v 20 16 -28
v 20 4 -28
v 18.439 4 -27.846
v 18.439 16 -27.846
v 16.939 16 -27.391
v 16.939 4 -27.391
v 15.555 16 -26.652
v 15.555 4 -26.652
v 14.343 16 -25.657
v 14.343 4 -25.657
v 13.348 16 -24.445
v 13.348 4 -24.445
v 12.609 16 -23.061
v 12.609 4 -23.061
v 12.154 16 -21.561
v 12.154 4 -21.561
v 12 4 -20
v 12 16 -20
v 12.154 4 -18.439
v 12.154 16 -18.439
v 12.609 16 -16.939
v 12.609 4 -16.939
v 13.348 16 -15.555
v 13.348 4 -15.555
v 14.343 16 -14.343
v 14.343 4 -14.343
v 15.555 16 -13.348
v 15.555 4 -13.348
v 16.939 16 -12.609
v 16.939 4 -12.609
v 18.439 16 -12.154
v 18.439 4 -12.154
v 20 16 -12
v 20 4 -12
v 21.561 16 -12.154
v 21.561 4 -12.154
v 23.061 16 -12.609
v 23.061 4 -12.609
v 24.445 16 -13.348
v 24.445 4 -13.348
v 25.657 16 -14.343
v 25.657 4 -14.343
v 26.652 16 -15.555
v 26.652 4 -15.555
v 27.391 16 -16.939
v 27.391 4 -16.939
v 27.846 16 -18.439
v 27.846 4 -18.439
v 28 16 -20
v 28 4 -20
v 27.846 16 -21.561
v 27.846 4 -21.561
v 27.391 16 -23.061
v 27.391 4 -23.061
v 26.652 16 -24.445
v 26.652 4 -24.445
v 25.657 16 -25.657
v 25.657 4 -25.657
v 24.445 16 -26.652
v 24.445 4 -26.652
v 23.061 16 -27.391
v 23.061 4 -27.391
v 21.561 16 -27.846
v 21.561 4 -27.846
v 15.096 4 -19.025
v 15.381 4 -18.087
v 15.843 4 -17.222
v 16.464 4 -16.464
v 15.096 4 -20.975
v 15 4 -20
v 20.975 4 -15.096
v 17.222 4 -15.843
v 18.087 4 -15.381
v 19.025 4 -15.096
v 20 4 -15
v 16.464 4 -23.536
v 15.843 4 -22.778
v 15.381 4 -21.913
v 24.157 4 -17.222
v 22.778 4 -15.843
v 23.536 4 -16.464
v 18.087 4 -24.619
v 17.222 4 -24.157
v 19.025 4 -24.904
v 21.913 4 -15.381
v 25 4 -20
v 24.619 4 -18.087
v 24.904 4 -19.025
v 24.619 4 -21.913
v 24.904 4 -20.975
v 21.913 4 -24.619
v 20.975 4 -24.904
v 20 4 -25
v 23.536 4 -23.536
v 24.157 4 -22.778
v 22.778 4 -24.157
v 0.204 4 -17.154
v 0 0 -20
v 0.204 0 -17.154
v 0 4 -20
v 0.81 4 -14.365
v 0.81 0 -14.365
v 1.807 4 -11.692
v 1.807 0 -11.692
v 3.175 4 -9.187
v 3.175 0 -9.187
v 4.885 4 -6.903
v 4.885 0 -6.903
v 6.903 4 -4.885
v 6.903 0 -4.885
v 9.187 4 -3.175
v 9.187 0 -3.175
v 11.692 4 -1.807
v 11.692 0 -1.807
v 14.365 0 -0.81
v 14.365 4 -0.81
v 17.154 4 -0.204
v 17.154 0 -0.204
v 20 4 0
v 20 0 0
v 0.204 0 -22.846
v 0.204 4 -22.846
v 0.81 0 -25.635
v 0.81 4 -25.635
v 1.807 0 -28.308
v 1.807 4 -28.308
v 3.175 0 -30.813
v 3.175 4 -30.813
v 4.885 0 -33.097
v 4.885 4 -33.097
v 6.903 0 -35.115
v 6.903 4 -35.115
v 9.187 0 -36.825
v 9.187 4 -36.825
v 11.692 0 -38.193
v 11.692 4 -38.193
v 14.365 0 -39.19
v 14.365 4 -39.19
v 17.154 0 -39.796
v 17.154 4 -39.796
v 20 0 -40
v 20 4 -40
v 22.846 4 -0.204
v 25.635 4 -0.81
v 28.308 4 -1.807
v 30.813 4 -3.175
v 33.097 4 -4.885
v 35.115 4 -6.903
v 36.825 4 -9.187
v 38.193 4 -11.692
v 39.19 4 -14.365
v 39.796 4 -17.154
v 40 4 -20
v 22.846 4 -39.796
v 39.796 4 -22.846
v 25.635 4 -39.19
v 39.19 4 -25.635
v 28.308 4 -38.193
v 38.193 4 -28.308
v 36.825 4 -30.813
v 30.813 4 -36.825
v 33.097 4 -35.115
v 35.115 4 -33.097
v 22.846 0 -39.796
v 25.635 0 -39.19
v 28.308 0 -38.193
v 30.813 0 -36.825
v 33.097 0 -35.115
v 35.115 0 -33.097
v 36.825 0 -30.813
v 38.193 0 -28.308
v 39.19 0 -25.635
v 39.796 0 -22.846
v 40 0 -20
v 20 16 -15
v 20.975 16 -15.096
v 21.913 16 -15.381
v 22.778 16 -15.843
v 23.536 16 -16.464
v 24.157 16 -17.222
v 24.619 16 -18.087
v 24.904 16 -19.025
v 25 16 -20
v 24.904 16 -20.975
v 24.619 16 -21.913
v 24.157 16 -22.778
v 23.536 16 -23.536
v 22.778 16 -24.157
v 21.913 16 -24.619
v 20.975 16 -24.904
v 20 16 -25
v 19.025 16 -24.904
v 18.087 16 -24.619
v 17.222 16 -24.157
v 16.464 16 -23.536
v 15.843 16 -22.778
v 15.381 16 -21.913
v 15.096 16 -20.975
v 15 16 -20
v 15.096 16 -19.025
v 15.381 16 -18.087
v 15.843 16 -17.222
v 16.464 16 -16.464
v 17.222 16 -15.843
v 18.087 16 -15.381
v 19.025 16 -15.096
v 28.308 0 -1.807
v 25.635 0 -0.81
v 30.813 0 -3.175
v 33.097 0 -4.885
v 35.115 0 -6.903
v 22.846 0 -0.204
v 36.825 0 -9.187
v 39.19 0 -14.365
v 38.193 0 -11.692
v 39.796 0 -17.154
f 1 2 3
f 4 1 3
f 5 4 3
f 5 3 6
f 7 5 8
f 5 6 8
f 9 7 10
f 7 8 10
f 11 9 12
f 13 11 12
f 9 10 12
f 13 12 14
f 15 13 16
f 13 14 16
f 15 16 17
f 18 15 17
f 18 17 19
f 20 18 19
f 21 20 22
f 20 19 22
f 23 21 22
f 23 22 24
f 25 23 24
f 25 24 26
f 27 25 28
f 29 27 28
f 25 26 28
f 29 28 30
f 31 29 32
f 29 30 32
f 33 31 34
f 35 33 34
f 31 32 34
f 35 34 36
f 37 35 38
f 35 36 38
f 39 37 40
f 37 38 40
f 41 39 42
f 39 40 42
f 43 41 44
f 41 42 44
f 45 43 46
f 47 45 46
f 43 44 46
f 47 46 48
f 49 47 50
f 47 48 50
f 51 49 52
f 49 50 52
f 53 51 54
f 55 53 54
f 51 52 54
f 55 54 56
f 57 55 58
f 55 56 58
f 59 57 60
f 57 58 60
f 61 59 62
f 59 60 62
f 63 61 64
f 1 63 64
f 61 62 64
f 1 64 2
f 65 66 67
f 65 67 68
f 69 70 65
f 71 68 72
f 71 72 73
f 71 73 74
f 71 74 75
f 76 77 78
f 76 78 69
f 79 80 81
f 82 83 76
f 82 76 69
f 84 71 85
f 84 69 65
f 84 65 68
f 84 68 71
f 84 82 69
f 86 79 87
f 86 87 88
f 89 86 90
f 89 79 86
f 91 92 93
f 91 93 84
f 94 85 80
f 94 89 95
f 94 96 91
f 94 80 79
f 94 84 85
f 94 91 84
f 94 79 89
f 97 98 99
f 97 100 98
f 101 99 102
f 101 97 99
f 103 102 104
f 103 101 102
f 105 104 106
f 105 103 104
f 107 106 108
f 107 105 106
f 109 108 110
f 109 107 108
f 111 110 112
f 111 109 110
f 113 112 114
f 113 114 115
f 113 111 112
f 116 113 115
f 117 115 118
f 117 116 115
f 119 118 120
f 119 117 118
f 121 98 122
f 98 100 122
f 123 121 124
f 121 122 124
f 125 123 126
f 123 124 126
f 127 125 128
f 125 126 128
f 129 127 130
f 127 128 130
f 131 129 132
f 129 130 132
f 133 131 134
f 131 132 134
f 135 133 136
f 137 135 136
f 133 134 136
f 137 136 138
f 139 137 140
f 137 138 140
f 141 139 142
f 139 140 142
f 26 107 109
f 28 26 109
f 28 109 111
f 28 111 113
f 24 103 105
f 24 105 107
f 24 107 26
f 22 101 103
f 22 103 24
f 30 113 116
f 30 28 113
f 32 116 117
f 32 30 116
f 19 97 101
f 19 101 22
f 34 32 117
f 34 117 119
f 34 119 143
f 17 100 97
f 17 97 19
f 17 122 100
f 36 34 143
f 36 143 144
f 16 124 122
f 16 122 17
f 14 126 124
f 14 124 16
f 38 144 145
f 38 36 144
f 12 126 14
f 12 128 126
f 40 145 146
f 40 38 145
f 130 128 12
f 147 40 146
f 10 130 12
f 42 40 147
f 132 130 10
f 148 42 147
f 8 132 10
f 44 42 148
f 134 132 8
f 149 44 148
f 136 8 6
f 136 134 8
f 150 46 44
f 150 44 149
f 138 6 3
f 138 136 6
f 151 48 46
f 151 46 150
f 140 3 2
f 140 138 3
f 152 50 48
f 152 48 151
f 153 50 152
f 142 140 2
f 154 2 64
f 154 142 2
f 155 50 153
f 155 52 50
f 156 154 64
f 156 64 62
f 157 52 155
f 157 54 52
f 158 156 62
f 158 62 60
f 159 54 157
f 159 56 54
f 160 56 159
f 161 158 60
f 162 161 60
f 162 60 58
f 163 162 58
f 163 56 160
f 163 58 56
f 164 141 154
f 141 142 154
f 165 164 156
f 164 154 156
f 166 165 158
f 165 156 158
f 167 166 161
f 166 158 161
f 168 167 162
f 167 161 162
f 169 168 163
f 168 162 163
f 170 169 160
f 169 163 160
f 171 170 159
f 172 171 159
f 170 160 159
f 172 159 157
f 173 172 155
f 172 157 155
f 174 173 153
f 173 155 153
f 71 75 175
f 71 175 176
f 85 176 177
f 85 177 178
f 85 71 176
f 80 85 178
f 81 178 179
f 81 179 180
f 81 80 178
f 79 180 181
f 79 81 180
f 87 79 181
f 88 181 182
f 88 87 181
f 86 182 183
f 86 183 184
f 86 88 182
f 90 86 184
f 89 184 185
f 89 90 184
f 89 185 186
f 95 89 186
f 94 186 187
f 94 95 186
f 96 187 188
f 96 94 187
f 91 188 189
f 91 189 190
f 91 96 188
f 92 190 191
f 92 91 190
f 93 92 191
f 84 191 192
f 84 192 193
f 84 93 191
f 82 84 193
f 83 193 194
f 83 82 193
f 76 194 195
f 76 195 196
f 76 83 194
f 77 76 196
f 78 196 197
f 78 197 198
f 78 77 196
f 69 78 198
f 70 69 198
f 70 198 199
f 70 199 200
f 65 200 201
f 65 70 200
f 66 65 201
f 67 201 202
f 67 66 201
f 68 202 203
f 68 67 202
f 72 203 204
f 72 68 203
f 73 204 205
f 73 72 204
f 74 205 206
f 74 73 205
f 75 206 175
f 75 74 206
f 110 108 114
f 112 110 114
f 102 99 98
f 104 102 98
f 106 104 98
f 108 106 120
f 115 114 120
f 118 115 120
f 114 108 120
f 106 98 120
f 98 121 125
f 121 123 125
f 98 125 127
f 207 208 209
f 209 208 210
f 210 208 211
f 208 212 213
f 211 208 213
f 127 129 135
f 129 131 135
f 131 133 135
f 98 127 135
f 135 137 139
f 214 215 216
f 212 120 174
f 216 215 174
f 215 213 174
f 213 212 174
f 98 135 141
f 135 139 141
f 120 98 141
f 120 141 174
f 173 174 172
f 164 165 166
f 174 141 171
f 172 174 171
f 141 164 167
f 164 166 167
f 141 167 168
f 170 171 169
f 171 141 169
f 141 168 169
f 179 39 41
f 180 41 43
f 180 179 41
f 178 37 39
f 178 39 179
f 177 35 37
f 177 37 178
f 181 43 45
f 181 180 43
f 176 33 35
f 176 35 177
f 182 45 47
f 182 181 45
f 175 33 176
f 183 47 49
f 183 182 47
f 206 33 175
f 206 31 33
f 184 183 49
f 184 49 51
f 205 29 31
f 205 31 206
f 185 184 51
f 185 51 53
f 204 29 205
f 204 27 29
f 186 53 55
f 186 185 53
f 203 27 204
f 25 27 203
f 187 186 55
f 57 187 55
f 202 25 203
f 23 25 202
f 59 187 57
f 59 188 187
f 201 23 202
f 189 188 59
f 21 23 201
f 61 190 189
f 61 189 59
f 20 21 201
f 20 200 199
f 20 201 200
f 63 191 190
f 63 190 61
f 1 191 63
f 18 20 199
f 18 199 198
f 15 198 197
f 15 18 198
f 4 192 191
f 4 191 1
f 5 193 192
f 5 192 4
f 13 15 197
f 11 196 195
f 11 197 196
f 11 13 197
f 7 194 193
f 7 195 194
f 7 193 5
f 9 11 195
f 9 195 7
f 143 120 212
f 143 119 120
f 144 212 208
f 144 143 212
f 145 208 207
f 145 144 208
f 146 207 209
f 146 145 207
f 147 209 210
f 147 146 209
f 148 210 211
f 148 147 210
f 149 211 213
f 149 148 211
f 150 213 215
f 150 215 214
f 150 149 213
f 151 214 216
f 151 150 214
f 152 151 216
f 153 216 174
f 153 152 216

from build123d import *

# Parameters (mm, degrees)
SKETCH_1_W      = 40
SKETCH_1_H      = 40
EXTRUDE_1_DEPTH = 4
SKETCH_2_R      = 8
SKETCH_2_R_2    = 5
EXTRUDE_2_DEPTH = 12
FILLET_1_R      = 20


with BuildPart() as part:
    # Эскиз1 → Вытянуть1 (new body)
    with BuildSketch(Plane(origin=(0, 0, 0), x_dir=(1, 0, 0), z_dir=(0, 1, 0))):
        with Locations((20, 20)):
            Rectangle(SKETCH_1_W, SKETCH_1_H)
    extrude(amount=EXTRUDE_1_DEPTH)

    # Эскиз2 → Вытянуть2 (add)
    with BuildSketch(Plane(origin=(0, 4, 0), x_dir=(1, 0, 0), z_dir=(0, 1, 0))):
        with Locations(Location((20, 20, 0), (0, 0, 90))):
            Circle(SKETCH_2_R)
        with Locations(Location((20, 20, 0), (0, 0, 270))):
            Circle(SKETCH_2_R_2, mode=Mode.SUBTRACT)
    extrude(amount=EXTRUDE_2_DEPTH)

    # Скругление1
    fillet_1_edges = [part.edges().sort_by_distance(p)[0] for p in [
        (40, 2, 0),
        (0, 2, 0),
        (0, 2, -40),
        (40, 2, -40),
    ]]
    fillet(fillet_1_edges, radius=FILLET_1_R - 0.0001)  # a hair under: the kernel refuses the full size


solid = part.part
